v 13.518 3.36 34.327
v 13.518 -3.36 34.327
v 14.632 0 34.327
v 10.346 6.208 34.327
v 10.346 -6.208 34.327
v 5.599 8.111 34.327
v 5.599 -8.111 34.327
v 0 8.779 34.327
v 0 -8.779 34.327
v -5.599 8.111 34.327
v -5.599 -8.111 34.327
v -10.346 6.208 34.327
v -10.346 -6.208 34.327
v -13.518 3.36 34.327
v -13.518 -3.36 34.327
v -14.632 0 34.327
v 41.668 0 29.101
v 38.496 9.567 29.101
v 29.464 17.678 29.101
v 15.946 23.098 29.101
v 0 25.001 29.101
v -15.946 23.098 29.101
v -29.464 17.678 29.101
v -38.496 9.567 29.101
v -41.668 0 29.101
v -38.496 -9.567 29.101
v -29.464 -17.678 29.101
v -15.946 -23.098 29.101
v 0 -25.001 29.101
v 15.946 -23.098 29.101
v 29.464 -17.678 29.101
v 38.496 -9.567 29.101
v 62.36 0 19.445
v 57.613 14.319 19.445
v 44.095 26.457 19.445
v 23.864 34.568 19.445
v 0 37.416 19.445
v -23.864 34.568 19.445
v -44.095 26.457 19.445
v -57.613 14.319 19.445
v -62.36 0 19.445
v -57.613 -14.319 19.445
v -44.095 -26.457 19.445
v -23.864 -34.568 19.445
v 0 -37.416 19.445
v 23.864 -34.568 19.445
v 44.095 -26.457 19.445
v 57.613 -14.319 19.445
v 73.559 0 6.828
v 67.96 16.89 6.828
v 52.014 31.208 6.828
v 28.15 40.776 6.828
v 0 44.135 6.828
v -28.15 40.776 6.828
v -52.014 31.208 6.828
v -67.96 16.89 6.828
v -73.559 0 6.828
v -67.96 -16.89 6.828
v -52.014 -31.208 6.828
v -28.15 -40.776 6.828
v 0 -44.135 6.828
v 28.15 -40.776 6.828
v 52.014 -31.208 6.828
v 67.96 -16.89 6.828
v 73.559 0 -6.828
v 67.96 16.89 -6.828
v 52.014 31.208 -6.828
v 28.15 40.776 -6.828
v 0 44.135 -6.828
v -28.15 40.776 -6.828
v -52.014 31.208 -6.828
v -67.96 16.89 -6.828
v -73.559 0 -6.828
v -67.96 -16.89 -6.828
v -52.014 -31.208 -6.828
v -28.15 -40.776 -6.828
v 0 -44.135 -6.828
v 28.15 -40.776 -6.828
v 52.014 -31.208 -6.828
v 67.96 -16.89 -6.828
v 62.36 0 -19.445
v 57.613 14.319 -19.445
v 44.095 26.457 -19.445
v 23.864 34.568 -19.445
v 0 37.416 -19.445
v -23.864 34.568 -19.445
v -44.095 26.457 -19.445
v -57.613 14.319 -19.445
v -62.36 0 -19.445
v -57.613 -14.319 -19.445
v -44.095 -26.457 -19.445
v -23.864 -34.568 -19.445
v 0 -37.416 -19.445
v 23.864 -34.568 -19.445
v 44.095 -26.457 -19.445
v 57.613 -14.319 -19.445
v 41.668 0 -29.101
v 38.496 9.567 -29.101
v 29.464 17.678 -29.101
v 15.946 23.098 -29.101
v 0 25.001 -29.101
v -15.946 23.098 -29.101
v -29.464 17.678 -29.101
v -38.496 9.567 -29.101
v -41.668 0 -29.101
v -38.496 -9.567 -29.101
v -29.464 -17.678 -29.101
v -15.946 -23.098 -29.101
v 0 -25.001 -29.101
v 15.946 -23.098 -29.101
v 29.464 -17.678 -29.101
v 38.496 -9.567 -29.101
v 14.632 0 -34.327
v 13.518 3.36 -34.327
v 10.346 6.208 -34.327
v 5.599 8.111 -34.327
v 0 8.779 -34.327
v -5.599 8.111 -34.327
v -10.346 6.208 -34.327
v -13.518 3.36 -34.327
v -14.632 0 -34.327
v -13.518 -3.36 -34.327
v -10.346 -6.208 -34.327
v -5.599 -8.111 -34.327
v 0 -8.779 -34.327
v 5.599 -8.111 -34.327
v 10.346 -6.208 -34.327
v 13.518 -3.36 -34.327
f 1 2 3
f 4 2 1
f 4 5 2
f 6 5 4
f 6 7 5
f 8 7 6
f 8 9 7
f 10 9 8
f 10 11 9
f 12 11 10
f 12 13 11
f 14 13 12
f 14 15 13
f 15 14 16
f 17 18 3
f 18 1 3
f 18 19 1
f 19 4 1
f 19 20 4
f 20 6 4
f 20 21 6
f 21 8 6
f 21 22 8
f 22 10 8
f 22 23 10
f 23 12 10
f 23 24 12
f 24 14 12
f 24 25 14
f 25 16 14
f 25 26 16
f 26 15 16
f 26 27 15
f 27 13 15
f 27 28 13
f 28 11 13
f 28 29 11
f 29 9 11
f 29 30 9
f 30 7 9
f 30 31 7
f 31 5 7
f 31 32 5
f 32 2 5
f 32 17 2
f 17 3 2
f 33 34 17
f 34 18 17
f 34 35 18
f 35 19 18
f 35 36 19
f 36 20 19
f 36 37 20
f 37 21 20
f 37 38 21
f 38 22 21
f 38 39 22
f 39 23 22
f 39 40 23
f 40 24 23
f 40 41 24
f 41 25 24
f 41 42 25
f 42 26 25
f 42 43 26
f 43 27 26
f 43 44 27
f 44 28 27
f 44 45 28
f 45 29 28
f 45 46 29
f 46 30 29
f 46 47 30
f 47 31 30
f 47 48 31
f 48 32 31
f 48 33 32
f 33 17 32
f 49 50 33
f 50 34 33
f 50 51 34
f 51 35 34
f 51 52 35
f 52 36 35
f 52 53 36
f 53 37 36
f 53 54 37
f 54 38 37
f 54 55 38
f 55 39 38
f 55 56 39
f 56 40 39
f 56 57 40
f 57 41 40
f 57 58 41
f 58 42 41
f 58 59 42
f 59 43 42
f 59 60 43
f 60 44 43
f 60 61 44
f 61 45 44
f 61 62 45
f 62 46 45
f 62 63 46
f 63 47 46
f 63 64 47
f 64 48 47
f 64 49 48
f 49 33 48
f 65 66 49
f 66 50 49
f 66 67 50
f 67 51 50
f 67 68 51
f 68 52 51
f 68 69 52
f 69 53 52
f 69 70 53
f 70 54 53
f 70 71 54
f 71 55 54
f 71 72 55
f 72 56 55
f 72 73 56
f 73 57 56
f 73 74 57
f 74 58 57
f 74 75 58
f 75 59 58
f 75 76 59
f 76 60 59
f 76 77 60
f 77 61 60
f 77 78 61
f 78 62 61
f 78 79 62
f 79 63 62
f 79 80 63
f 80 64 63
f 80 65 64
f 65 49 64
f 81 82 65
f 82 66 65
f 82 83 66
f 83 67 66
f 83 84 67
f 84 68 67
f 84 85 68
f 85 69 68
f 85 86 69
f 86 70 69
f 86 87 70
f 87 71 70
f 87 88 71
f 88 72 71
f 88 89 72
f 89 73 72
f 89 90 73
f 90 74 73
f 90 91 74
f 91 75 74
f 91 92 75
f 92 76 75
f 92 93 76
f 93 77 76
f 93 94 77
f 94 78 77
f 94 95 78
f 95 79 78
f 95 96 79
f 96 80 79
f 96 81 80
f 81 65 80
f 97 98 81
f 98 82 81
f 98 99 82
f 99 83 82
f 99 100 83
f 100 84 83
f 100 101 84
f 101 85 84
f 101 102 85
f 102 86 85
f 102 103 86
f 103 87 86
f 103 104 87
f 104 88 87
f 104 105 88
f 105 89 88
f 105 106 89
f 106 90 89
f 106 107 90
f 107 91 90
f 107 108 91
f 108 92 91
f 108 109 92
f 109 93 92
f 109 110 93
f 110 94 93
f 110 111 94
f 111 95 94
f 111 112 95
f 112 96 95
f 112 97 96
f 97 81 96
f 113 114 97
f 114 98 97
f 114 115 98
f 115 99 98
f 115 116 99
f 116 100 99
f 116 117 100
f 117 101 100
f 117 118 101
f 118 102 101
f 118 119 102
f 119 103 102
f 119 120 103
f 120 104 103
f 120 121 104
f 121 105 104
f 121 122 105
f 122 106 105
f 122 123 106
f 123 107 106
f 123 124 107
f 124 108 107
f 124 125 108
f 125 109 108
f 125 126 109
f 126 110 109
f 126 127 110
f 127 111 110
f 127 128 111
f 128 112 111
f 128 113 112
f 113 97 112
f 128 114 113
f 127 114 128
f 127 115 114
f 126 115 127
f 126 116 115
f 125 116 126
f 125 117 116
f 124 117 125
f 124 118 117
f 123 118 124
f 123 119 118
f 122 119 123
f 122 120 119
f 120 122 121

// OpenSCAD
// Generated by SolidPython 1.0.1 on 2020-07-29 00:46:52


scale(v = [15, 9, 7]) {
	sphere(r = 5);
}
/***********************************************
*********      SolidPython code:      **********
************************************************
 
# import packages: SolidPython
from solid import *
from solid.utils import *
from itertools import chain, combinations, permutations


class Resize:

    def __init__(self, scad_file):
        self.scad_file = scad_file
        #self.scad_file = import_scad(scad_file)
        # cone/cylinder param:
        self.r1 = 0
        self.r2 = 0
        self.h = 0
        # rectangular prism param:
        self.w = 0
        self.l = 0
        # ellipse param:
        self.r = 0

    # import OpenScad code (file name corresponds to shape)


    # classify shape + parameters
    def assign(self, param1, param2, param3):
        if self.scad_file == 'cone.scad':
            self.r1 = param1
            self.r2 = param2
            self.h = param3
        elif self.scad_file == 'cylinder.scad':
            self.r1 = param1
            self.r2 = param2
            self.h = param3
        elif self.scad_file == 'rectangularPrism.scad':
            self.h = param1
            self.l = param2
            self.w = param3
        else:
            self.r = param1
            self.h = param2

    # resize parameters
    def iterate(self):
        x = range(3, 20, 2)
        i = 1
        if self.scad_file == 'cone.scad':
            tempList = list(permutations(x, 2))
            for temp in tempList:
                param1 = temp[0]
                param2 = temp[1]
                filepath = 'produced_scad_files/' + 'cone' + str(param1) + '_' + str(param2) + '_' + '.scad'
                scad_render_to_file(cylinder(h=param1, r1=param2, r2=0), filepath)

        elif self.scad_file == 'cylinder.scad':
            tempList = list(permutations(x, 3))
            for temp in tempList:
                param1 = temp[0]
                param2 = temp[1]
                filepath = 'produced_scad_files/' + 'cylinder' + str(param1) + '_' + str(param2) + '_' + '.scad'
                scad_render_to_file(cylinder(h=param1, r1=param2, r2=param2), filepath)

        elif self.scad_file == 'rectangularPrism.scad':
            tempList = list(permutations(x, 3))
            for temp in tempList:
                param1 = temp[0]
                param2 = temp[1]
                param3 = temp[2]
                filepath = 'produced_scad_files/' + 'rectangularPrism' + str(param1) + '_' + str(param2) + '_' + str(
                    param3) + '.scad'
                scad_render_to_file(cube(size=(param1, param2, param3)), filepath)

        elif self.scad_file == 'ellipse.scad':
            tempList = list(permutations(x, 4))
            for temp in tempList:
                param1 = temp[0]
                param2 = temp[1]
                param3 = temp[2]
                param4 = temp[3]
                filepath = 'produced_scad_files/' + 'ellipse' + str(param1) + '_' + str(param2) + '_' + str(param3) + '_' + str(param4) + '.scad'
                scad_render_to_file(scale([param1, param2, param3])(sphere(r=param4)), filepath)

    def render_to_scadfile(self):
        scad_render_to_file(scad, 'example.scad') 
 
************************************************/
